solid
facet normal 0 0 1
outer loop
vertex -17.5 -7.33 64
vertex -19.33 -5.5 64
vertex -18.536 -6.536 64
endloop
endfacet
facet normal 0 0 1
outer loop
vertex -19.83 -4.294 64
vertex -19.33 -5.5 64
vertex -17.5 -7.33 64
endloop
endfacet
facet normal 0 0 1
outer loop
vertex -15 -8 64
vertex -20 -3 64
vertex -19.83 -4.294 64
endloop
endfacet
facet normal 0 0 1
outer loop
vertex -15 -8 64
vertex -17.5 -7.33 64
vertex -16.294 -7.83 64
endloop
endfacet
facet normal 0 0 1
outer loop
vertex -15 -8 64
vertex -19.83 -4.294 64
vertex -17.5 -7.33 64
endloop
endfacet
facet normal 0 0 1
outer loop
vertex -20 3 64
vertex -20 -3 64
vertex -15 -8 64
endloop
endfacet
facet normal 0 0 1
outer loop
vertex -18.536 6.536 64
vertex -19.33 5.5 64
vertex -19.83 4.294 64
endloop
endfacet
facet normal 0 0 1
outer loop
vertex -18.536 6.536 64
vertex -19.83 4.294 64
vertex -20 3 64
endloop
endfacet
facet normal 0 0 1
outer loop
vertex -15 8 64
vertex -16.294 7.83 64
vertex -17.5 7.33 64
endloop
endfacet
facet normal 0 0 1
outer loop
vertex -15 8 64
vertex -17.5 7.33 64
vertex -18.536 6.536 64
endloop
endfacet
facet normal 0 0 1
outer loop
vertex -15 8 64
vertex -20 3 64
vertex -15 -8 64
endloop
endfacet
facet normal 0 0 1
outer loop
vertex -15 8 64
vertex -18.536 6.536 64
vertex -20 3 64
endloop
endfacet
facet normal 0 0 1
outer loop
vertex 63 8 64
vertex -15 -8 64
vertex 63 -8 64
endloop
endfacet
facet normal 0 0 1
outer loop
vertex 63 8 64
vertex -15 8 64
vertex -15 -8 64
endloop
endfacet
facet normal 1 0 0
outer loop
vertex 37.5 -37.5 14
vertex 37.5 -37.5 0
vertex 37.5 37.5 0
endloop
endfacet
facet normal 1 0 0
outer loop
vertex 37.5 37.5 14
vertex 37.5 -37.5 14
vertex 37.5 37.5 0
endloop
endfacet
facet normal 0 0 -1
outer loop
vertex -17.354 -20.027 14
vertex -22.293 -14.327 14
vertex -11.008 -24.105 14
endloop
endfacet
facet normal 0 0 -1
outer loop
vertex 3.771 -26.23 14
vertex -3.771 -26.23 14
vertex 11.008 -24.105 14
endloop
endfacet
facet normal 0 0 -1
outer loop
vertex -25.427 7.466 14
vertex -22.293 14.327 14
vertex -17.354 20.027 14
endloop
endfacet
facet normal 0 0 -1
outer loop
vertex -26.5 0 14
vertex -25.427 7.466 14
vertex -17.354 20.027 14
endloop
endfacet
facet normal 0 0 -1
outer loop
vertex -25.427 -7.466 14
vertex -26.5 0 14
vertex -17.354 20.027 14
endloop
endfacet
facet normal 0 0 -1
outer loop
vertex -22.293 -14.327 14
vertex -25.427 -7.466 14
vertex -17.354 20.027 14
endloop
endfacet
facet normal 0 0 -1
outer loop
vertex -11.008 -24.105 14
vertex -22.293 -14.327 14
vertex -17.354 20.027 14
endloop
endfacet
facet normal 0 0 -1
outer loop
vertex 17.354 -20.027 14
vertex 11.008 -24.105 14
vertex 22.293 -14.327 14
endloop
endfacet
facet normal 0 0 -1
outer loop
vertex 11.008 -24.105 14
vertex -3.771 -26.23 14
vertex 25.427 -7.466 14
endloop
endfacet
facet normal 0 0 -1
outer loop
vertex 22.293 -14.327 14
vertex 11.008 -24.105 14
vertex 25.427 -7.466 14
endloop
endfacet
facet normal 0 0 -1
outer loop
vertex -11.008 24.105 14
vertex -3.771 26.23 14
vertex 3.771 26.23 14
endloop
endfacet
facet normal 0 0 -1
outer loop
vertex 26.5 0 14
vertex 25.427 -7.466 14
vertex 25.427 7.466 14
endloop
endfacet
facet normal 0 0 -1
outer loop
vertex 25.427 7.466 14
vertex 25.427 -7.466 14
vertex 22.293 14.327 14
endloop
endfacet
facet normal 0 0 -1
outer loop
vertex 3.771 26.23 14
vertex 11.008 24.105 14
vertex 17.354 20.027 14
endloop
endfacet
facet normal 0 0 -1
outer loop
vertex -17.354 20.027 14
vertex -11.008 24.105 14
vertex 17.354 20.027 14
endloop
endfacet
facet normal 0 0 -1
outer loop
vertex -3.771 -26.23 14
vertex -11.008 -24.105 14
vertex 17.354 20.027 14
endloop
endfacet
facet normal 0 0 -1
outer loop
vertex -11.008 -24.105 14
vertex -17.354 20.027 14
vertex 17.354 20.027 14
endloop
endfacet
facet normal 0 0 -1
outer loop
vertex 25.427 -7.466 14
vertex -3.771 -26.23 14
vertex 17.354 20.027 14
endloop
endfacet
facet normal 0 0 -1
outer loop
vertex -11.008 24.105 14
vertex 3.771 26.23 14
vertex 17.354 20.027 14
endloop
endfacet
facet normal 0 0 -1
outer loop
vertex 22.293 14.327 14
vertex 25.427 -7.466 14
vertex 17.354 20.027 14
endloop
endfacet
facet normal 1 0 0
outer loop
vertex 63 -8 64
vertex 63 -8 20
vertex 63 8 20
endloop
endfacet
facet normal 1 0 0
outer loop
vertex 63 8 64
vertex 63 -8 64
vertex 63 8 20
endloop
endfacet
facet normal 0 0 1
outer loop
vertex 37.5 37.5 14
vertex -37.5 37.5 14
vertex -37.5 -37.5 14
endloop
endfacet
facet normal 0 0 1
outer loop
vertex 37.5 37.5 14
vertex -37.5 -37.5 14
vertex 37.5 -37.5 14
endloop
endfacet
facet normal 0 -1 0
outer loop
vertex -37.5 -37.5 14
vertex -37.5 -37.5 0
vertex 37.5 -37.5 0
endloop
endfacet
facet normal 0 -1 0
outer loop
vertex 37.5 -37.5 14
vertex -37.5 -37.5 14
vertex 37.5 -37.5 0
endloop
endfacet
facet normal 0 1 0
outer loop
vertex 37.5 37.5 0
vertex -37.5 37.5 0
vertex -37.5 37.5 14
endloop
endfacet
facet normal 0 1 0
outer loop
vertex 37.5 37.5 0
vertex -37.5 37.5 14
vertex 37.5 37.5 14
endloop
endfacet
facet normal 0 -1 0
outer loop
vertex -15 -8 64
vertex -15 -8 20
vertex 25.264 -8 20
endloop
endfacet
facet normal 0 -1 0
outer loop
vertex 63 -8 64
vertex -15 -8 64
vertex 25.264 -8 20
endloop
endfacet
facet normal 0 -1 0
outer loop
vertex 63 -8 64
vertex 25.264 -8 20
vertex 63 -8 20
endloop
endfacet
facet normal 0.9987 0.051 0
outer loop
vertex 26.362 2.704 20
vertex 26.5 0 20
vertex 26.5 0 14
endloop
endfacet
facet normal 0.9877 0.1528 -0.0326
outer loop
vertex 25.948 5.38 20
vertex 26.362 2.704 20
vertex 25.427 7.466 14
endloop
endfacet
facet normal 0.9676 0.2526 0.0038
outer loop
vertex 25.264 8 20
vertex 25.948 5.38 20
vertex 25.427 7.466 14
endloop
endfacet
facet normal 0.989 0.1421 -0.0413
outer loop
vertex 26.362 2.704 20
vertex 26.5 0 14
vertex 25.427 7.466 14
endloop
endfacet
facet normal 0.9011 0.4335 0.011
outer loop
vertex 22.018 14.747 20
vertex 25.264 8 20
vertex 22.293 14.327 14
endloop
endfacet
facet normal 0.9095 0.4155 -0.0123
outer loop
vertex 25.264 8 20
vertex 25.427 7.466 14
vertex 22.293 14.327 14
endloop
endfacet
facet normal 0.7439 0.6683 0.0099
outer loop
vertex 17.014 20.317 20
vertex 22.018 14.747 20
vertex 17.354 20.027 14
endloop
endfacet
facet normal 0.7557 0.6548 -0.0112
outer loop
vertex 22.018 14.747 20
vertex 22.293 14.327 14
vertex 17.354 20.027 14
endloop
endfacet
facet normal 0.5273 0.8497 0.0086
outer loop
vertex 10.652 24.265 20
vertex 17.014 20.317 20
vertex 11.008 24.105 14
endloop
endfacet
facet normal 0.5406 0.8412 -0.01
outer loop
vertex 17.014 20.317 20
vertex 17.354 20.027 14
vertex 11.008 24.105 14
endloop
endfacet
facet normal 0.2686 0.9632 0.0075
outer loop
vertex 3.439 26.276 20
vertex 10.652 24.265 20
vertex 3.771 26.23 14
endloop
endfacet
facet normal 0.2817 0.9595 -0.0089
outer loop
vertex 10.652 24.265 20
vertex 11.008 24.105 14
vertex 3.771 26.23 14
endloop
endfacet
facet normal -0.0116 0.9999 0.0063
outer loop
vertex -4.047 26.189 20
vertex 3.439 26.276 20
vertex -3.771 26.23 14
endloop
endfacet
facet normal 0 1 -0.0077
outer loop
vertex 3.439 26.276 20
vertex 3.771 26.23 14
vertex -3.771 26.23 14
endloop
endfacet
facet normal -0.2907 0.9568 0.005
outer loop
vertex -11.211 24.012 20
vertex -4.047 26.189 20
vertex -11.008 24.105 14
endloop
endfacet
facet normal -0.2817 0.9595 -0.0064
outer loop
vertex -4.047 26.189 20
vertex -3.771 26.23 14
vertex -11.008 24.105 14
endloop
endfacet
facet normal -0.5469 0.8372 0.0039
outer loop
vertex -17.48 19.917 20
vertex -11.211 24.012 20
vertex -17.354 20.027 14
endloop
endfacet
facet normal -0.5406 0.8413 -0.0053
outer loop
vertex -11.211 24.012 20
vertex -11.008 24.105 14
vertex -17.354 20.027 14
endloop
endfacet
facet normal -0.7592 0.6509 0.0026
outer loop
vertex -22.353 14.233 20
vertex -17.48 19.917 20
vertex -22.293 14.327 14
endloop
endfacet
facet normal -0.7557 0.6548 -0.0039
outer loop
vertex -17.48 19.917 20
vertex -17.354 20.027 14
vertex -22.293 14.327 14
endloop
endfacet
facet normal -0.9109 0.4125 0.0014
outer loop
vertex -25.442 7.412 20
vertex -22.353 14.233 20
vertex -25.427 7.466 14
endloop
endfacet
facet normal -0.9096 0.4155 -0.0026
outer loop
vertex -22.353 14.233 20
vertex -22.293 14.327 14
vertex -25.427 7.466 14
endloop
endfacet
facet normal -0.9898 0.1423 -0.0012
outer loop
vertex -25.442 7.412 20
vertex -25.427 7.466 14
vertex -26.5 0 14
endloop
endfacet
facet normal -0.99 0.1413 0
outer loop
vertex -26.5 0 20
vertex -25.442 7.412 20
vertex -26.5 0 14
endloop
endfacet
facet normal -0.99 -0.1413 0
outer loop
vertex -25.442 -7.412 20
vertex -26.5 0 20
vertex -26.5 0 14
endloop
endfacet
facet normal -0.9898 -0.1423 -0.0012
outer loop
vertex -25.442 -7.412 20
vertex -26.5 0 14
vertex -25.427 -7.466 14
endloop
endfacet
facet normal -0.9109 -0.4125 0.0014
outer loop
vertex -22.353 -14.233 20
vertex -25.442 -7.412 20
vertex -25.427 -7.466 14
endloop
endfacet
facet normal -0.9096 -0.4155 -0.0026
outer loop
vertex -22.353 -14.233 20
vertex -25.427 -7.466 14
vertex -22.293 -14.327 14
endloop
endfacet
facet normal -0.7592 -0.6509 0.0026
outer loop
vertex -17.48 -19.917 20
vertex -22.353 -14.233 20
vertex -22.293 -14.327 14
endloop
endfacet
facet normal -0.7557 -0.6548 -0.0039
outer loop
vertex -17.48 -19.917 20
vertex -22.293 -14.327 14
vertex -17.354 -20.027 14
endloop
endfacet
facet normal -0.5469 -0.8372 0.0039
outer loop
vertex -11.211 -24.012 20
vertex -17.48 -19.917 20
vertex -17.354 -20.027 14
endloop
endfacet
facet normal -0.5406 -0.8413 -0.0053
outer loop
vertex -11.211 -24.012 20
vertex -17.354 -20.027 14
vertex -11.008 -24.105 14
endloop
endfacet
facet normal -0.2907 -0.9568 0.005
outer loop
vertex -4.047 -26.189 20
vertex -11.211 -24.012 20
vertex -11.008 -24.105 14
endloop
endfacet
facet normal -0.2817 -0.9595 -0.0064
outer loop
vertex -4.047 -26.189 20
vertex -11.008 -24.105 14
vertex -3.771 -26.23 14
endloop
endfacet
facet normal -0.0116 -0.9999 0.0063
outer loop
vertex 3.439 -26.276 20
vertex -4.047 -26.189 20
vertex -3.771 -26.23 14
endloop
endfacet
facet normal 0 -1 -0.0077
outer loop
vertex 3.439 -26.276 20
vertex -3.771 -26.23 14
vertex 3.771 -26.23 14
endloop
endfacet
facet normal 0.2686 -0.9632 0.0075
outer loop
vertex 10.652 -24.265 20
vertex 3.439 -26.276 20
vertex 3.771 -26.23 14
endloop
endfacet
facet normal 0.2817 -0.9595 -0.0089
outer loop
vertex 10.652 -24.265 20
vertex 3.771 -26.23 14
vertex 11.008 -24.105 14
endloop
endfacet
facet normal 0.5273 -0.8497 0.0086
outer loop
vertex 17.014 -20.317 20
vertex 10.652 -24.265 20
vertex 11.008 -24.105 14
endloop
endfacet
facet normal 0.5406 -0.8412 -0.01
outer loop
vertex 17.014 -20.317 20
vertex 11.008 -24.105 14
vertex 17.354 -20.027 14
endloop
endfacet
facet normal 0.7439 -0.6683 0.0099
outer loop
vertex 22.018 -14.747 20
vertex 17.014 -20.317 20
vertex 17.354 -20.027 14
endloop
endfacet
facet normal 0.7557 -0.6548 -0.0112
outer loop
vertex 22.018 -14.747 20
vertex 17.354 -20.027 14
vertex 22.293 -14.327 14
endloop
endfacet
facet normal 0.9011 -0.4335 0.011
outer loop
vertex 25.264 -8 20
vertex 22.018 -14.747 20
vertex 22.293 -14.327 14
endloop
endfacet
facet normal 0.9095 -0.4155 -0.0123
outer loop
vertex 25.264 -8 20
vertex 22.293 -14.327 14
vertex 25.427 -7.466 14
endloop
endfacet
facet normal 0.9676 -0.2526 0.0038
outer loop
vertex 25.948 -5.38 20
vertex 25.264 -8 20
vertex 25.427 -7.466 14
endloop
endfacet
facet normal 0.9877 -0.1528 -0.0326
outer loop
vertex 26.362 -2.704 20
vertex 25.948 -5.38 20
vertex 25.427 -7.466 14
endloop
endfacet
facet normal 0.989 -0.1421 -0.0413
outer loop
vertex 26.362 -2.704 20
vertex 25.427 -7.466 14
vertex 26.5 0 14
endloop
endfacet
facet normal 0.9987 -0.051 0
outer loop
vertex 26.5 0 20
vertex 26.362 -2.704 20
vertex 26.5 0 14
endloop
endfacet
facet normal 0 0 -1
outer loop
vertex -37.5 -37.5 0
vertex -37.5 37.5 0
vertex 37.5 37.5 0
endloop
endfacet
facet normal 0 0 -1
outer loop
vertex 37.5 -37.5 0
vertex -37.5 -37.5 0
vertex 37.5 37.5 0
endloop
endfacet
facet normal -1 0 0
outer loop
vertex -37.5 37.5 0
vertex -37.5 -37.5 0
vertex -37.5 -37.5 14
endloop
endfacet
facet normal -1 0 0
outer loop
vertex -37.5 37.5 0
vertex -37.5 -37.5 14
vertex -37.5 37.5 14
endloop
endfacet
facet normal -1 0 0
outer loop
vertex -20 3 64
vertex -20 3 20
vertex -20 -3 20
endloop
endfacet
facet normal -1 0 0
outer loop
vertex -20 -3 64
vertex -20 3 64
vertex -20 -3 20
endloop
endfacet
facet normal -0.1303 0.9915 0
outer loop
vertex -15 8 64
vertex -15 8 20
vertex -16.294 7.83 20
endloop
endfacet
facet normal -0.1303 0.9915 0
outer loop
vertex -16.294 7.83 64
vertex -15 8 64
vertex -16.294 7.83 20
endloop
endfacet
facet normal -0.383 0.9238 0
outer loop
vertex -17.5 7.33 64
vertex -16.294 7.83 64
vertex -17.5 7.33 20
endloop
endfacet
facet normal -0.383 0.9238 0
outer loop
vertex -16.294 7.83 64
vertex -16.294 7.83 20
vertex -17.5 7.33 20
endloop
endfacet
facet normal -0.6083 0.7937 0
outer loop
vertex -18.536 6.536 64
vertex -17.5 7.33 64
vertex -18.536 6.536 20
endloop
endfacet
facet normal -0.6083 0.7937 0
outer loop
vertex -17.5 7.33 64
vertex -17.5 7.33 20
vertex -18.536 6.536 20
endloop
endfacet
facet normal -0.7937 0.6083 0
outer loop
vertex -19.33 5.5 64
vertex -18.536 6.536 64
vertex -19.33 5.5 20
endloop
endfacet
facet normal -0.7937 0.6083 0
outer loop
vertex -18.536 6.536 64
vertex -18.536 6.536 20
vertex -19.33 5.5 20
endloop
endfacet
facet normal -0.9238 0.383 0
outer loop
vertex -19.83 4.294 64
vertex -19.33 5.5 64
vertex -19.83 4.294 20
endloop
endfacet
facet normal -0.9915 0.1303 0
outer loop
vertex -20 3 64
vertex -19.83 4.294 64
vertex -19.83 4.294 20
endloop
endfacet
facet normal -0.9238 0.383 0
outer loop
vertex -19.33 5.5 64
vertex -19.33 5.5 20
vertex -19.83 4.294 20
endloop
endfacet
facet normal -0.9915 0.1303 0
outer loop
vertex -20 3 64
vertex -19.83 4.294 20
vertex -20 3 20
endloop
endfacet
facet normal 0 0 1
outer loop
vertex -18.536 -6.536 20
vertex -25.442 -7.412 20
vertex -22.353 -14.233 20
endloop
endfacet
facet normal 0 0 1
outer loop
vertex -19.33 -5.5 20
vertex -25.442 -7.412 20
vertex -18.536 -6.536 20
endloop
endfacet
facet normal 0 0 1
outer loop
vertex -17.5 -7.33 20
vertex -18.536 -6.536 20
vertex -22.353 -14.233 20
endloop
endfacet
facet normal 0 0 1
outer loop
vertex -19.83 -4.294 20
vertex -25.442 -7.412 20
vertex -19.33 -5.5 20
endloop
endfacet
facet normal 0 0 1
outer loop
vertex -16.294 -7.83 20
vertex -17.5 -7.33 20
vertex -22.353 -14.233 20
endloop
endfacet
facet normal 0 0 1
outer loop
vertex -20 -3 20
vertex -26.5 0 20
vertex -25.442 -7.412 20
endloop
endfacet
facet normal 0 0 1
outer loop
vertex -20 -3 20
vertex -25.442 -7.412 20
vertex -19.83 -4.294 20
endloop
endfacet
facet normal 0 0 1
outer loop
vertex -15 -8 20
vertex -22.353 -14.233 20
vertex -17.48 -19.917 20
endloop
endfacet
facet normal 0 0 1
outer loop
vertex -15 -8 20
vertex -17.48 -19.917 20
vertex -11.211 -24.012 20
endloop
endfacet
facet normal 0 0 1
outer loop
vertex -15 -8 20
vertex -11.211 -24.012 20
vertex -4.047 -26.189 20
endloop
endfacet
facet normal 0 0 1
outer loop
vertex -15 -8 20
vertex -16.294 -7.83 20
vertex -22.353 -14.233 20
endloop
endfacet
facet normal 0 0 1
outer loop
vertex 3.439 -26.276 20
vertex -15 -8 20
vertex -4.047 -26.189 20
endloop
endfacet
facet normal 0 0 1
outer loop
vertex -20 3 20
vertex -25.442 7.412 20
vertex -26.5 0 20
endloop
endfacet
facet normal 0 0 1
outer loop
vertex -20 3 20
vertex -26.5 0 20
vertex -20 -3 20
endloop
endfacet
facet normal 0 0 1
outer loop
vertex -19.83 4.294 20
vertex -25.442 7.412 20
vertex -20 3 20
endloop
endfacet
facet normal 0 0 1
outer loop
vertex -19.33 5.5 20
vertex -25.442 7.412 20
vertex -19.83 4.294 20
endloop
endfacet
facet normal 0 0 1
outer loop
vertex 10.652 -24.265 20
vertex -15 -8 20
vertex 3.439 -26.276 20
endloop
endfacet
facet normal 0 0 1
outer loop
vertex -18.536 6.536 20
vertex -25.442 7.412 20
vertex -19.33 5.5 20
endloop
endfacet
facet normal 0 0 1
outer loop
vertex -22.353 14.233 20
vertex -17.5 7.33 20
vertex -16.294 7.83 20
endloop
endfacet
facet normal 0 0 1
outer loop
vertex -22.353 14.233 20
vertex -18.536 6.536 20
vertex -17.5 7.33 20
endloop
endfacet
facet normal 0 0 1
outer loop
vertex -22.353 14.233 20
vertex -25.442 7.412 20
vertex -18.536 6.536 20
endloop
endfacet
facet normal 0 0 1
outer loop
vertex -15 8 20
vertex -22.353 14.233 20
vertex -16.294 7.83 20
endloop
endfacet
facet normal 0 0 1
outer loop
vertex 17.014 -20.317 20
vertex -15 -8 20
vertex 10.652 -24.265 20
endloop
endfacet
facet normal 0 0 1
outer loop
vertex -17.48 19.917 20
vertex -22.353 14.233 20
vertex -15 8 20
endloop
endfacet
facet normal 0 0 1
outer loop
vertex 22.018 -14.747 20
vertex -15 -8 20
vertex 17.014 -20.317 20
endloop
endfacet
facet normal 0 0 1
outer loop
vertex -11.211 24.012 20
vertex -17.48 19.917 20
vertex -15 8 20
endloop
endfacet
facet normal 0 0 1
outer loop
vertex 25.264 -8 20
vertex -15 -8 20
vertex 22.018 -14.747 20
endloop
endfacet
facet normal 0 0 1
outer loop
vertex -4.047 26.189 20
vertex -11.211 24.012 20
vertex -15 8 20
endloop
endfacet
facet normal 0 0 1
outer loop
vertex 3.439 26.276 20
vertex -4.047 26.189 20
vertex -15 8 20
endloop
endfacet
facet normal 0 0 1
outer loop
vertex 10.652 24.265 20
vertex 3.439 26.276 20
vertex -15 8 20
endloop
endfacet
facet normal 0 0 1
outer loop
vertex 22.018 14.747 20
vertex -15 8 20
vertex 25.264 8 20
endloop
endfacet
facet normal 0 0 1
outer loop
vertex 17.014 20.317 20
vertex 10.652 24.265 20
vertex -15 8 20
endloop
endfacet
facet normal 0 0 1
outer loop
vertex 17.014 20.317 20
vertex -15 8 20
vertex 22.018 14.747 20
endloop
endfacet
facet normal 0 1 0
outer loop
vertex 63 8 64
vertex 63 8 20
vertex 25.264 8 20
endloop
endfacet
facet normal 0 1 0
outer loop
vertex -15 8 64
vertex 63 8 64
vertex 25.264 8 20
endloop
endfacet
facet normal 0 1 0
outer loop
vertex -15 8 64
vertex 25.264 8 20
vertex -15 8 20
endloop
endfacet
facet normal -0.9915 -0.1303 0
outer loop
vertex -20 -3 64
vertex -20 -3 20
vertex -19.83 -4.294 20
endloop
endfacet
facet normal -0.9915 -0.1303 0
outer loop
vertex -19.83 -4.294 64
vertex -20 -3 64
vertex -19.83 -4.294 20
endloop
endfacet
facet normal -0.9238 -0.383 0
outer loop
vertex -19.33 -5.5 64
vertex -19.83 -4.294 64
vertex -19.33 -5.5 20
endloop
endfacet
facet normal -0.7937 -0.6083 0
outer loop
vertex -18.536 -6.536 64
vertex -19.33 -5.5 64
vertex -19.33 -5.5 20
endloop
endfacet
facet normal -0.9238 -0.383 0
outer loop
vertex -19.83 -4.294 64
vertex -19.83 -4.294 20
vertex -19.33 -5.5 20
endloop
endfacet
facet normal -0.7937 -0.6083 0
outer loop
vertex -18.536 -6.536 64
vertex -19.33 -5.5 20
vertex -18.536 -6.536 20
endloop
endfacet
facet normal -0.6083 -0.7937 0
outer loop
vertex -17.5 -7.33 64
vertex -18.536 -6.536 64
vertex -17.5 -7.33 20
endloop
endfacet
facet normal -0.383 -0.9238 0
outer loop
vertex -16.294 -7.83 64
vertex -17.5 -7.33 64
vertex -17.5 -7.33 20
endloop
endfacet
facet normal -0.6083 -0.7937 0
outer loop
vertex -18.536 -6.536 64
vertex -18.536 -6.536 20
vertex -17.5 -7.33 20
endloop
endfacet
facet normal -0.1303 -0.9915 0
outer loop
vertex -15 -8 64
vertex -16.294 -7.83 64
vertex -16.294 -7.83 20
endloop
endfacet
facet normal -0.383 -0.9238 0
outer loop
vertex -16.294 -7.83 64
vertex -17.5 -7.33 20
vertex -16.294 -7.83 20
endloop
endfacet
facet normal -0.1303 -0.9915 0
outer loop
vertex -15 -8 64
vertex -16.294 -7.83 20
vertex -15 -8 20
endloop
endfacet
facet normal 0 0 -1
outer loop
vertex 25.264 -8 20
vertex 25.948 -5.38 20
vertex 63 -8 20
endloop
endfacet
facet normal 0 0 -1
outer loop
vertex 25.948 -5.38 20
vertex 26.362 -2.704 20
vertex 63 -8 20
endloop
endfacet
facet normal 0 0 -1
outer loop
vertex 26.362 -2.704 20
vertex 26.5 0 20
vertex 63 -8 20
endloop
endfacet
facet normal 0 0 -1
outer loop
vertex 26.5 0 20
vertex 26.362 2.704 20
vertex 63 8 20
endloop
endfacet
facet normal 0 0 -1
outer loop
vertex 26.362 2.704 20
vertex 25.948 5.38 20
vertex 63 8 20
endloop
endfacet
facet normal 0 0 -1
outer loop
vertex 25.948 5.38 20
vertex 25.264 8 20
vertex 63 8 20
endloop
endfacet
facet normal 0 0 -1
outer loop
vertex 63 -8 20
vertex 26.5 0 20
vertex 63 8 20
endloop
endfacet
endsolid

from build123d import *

# Parameters (mm, degrees)
F0_W     = 75
F0_H     = 75
F1_DEPTH = 14
F2_R     = 26.5
F3_DEPTH = 6
F5_DEPTH = 44


with BuildPart() as f1:
    # F0 (on Top) → F1 (new body)
    with BuildSketch(Plane.XY):
        Rectangle(F0_W, F0_H)
    extrude(amount=F1_DEPTH)


with BuildPart() as f3:
    # F2 (on face) → F3 (new body)
    with BuildSketch(Plane.XY.offset(14)):
        Circle(F2_R)
    extrude(amount=F3_DEPTH)

    # F4 (on face) → F5 (join)
    with BuildSketch(Plane.XY.offset(20)):
        with BuildLine():
            Line((63, 8), (-15, 8))
            ThreePointArc((-15, 8), (-18.535534, 6.535534), (-20, 3))
            Line((-20, 3), (-20, -3))
            ThreePointArc((-20, -3), (-18.535534, -6.535534), (-15, -8))
            Line((-15, -8), (63, -8))
            Line((63, -8), (63, 8))
        make_face()
    extrude(amount=F5_DEPTH)


solid = Compound([f1.part, f3.part])
